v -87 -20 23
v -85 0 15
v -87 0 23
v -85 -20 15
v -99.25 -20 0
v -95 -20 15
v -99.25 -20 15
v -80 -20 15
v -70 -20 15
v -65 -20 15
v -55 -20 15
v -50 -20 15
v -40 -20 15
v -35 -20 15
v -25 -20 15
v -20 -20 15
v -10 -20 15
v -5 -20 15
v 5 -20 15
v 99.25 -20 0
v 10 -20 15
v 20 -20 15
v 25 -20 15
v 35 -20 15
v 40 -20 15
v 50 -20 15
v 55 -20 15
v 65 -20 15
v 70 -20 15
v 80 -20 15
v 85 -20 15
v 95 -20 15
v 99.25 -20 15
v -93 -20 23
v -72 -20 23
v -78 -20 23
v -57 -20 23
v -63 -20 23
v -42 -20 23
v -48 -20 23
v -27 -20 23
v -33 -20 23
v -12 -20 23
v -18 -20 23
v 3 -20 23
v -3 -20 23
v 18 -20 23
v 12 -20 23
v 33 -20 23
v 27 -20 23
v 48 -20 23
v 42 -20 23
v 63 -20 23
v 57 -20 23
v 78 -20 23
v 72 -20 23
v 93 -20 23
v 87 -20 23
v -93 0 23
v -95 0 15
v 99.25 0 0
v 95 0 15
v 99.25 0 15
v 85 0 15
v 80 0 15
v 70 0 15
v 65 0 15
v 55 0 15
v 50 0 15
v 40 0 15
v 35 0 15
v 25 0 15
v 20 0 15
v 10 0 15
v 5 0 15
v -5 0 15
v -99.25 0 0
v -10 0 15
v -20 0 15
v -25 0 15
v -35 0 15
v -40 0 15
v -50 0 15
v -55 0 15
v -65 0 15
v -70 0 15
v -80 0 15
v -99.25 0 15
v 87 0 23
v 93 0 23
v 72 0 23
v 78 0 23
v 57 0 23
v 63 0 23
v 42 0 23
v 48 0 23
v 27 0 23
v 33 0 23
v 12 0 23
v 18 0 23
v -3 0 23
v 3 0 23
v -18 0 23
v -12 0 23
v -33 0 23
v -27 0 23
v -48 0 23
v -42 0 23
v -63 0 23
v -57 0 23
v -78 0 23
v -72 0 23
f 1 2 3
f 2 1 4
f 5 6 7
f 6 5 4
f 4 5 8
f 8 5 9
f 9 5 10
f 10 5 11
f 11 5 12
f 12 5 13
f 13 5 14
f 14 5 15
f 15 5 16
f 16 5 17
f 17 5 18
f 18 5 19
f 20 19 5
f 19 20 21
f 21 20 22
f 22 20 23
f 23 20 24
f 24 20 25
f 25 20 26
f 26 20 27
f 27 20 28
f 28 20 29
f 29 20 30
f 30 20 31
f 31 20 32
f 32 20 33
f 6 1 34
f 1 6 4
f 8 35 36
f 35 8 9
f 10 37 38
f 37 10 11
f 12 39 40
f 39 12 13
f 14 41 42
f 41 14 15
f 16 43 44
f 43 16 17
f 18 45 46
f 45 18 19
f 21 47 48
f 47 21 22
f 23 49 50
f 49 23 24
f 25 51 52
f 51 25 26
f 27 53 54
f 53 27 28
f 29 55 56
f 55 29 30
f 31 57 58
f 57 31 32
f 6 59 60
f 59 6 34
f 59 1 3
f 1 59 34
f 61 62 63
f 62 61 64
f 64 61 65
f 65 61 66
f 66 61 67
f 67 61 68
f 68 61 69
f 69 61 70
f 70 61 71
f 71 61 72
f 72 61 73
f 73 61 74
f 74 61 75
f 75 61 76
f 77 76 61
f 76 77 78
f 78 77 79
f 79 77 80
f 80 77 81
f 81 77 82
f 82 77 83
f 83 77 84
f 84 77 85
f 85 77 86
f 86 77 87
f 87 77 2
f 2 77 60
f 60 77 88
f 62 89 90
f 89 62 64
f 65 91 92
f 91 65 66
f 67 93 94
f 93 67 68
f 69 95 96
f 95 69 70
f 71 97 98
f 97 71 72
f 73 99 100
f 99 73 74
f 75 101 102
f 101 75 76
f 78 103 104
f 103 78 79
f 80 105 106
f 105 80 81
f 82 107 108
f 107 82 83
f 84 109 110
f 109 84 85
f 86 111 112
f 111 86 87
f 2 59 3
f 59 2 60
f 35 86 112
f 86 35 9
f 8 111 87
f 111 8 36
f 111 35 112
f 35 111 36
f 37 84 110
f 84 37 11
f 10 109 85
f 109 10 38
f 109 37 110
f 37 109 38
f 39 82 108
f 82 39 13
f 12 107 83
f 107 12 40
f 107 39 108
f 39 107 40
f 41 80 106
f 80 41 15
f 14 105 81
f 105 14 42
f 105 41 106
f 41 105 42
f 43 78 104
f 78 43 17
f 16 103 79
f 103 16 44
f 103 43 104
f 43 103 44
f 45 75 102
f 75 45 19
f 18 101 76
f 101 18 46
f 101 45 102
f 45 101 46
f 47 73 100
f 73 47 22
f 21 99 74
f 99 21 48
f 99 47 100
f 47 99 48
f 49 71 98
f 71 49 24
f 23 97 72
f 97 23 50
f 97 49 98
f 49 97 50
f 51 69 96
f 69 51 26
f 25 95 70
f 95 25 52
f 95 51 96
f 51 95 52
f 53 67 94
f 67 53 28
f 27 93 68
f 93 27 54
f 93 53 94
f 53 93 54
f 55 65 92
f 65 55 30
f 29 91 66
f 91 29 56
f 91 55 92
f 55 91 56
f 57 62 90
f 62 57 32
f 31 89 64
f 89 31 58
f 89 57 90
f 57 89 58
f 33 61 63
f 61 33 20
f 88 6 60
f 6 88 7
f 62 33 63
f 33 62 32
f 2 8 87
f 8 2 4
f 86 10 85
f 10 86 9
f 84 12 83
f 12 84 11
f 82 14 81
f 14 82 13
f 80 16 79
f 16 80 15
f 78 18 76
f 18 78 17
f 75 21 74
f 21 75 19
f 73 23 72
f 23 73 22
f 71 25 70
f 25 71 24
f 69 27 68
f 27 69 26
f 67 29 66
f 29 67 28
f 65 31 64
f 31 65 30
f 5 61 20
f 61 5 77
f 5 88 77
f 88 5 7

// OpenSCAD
$fn = 32;

// ----------------------------------------------------------------------
// Toothed rack, 13 teeth
// 15 mm pitch, 8 mm teeth
// ----------------------------------------------------------------------

// --- parameters (mm) ---
bar_w = 20;     // bar width (Y)
bar_h = 15;     // bar height (Z)
teeth = 13;     // number of teeth
pitch = 15;     // tooth pitch
tooth_h = 8;    // tooth height above the bar
root_w = 10.5;  // tooth width at the root
crest_w = 6;    // tooth width at the crest

// --- derived feature positions (mm) ---
span = (teeth - 1) * pitch;  // = 180   distance between the outer teeth
bar_l = span + root_w + 8;   // = 198.5   bar length: teeth plus 4 mm at each end
tooth_x = -span / 2;         // = -90   X of the first tooth
height = bar_h + tooth_h;    // = 23   overall height
feature_centers = [
  [tooth_x + 0 * pitch, -bar_w / 2],
  [tooth_x + 1 * pitch, -bar_w / 2],
  [tooth_x + 2 * pitch, -bar_w / 2],
  [tooth_x + 3 * pitch, -bar_w / 2],
  [tooth_x + 4 * pitch, -bar_w / 2],
  [tooth_x + 5 * pitch, -bar_w / 2],
  [tooth_x + 6 * pitch, -bar_w / 2],
  [tooth_x + 7 * pitch, -bar_w / 2],
  [tooth_x + 8 * pitch, -bar_w / 2],
  [tooth_x + 9 * pitch, -bar_w / 2],
  [tooth_x + 10 * pitch, -bar_w / 2],
  [tooth_x + 11 * pitch, -bar_w / 2],
  [tooth_x + 12 * pitch, -bar_w / 2]
];   // tooth centre line, drives the tooth loop

// bar with a rack of teeth, one extruded trapezoium per centre
module rack_tooth() {
  linear_extrude(height = bar_w)
    polygon(points = [
      [0, 0],
      [root_w, 0],
      [root_w / 2 + crest_w / 2, tooth_h + 1],
      [root_w / 2 - crest_w / 2, tooth_h + 1]
    ]);
}

union() {
  translate([-bar_l / 2, -bar_w, 0]) cube([bar_l, bar_w, bar_h]);
  for (centre = feature_centers)
    translate([centre[0] - root_w / 2, 0, bar_h - 1]) rotate([90, 0, 0]) rack_tooth();
}
